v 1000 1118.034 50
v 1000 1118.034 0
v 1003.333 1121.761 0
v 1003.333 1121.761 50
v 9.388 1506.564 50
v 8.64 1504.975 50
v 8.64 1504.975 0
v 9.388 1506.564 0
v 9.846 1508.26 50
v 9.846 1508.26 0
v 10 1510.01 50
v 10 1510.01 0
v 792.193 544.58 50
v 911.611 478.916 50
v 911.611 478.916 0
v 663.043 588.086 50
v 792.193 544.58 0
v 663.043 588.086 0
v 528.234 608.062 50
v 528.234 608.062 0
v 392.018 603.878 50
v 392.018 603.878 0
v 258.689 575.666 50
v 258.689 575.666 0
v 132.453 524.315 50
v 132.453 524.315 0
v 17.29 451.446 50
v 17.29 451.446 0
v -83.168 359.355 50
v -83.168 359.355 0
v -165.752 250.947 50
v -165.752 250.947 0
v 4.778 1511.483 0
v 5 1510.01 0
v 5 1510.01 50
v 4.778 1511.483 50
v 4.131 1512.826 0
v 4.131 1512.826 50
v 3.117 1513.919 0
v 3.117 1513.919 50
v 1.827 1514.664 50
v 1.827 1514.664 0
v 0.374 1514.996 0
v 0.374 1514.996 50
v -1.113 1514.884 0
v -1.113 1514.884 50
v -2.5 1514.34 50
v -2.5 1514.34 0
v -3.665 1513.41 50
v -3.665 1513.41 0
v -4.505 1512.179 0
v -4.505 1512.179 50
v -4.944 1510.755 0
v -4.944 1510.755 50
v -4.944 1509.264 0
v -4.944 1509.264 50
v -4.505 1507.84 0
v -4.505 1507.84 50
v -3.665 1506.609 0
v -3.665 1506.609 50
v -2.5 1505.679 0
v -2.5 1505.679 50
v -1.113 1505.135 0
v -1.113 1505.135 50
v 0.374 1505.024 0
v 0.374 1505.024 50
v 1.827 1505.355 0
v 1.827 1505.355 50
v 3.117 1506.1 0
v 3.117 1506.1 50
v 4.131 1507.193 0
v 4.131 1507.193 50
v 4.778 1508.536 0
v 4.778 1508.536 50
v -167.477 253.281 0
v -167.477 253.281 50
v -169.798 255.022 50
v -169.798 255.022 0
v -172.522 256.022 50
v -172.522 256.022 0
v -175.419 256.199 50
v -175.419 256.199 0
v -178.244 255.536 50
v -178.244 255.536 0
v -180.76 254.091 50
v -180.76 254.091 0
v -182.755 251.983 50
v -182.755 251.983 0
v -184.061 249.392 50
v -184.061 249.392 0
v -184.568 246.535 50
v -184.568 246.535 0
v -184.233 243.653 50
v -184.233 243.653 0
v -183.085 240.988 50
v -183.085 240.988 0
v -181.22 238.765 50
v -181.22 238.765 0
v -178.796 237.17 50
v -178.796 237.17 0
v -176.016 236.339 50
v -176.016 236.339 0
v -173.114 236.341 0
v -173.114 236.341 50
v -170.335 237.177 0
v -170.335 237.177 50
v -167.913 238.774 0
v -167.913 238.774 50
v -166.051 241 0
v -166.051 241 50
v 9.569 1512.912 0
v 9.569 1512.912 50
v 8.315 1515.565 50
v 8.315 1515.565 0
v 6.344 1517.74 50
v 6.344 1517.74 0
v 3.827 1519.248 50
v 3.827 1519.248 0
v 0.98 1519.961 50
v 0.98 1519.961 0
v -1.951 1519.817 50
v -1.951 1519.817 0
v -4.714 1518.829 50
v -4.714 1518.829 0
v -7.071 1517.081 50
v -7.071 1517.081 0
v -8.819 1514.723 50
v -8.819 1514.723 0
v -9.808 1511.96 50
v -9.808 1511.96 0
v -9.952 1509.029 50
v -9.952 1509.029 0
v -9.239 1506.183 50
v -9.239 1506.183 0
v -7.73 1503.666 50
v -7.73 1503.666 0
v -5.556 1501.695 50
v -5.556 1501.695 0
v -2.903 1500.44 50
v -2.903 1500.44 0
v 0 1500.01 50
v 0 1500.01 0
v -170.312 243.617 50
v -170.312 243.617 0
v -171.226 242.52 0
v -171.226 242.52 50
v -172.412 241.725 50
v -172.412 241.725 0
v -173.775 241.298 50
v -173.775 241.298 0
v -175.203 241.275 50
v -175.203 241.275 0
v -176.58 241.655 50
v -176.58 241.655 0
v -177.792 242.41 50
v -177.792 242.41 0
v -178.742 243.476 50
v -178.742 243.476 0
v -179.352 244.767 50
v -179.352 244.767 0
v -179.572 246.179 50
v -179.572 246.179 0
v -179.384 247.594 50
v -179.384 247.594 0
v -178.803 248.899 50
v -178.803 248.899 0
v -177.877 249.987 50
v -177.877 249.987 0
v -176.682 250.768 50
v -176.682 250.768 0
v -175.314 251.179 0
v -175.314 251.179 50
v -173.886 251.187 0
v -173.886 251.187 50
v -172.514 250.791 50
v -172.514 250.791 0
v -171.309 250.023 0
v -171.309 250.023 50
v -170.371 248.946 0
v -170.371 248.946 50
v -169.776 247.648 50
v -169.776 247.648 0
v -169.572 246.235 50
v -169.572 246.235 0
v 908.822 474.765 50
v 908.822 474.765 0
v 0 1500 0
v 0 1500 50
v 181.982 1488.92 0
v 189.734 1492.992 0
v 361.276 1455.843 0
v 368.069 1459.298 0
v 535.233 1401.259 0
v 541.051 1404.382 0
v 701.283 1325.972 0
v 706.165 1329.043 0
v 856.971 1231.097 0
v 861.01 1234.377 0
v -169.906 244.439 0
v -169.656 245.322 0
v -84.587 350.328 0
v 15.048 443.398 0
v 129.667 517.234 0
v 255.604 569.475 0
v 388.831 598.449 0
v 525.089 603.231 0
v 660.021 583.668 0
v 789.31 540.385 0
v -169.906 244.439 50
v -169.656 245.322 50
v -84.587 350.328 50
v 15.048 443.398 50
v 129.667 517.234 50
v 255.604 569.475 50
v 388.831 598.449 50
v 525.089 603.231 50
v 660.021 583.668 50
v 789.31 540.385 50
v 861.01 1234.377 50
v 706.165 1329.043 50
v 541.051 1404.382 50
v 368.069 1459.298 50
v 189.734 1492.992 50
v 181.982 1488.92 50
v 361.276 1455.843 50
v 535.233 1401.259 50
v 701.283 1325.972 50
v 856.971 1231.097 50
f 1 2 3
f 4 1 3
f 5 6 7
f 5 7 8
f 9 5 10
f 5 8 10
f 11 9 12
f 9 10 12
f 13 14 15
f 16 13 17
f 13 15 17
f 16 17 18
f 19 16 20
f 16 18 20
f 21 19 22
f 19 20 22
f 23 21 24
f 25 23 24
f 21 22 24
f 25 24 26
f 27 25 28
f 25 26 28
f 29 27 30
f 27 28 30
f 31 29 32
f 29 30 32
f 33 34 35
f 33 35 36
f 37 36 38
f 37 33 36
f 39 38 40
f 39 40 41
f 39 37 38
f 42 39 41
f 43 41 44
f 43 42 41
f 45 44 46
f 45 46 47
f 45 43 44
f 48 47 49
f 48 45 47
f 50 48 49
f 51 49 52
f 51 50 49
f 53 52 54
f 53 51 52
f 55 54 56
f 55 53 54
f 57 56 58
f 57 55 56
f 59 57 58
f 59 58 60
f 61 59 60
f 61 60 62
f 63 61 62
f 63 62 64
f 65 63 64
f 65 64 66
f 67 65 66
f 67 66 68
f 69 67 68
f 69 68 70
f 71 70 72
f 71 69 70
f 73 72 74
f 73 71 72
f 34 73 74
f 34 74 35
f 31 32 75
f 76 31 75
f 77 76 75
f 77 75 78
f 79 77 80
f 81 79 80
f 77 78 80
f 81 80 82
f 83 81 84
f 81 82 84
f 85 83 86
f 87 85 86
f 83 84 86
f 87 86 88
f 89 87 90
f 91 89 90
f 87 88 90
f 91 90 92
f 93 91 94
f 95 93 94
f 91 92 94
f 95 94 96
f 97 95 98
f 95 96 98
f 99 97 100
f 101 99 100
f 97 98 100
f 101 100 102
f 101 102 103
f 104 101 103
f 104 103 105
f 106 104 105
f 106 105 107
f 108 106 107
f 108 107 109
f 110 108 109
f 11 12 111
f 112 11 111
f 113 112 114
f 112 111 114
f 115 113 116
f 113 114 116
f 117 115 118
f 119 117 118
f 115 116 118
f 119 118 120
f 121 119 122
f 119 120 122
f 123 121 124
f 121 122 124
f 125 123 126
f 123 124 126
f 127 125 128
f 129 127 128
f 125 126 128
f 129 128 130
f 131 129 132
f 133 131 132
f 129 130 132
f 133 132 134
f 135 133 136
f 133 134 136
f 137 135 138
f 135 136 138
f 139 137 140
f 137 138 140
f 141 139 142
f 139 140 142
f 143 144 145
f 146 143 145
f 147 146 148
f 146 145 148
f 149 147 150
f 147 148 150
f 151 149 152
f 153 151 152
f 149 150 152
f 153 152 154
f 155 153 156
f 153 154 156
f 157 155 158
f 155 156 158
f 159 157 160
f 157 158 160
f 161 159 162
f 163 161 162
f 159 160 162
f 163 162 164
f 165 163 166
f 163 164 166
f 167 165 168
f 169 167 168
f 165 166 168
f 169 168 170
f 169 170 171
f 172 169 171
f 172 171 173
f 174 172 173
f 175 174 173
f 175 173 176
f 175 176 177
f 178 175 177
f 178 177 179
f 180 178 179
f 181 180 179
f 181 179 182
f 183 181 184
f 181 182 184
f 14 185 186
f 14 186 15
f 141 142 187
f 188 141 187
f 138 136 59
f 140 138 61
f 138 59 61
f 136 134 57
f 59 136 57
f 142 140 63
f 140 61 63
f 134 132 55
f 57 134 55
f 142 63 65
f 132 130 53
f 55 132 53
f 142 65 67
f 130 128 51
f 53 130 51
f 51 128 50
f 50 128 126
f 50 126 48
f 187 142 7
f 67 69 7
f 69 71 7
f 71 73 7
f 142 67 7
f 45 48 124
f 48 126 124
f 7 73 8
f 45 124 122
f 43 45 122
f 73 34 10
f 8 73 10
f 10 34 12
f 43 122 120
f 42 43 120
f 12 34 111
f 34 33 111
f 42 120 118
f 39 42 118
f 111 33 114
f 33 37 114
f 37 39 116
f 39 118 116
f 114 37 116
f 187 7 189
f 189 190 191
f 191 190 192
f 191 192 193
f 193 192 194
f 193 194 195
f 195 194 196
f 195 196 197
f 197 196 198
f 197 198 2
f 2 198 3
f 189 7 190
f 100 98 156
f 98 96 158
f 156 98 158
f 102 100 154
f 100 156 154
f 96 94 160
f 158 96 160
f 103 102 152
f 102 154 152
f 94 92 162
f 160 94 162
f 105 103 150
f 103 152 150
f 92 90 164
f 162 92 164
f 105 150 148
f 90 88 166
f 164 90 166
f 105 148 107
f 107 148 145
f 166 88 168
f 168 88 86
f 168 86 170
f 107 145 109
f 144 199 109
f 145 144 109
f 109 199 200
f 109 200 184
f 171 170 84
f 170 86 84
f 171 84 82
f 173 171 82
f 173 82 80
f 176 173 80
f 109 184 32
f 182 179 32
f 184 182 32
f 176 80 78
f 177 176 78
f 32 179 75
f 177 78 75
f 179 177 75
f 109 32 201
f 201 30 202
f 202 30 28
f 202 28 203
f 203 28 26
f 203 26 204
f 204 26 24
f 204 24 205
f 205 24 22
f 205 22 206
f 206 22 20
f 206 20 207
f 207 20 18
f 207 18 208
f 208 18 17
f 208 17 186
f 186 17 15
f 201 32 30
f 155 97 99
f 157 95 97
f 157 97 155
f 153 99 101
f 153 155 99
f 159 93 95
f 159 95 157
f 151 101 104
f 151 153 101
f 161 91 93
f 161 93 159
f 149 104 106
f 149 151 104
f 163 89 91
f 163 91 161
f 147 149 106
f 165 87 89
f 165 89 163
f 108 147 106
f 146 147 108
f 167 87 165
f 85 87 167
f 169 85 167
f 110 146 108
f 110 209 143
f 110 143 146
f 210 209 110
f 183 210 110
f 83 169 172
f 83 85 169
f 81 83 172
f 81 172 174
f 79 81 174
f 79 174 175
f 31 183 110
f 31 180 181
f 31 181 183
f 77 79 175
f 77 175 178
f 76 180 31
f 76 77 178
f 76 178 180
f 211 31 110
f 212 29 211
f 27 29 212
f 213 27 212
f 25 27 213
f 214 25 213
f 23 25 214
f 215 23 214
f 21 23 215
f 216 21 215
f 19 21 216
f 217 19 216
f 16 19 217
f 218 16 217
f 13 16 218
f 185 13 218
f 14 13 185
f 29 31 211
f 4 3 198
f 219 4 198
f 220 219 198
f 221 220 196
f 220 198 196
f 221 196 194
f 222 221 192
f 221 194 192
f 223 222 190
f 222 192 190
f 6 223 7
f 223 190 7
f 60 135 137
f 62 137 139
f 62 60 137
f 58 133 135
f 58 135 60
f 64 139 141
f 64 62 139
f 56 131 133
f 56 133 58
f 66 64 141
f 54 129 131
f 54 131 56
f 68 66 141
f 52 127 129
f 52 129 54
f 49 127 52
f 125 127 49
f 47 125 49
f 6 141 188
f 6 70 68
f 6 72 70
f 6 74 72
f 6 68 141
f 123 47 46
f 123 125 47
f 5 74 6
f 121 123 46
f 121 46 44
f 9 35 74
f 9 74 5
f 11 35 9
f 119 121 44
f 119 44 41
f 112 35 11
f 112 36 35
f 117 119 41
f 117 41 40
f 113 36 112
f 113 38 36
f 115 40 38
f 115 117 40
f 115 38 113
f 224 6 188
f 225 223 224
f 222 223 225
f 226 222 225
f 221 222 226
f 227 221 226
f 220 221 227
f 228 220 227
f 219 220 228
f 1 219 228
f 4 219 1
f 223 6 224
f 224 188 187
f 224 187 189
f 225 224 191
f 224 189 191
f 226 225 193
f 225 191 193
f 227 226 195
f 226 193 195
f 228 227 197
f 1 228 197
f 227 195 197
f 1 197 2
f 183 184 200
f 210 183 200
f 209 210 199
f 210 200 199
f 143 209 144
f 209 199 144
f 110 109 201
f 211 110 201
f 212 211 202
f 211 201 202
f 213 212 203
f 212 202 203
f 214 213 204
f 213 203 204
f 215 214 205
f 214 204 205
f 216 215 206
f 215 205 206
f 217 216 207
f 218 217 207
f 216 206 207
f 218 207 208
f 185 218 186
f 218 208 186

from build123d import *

# Parameters (mm, degrees)
F0_R     = 5
F1_DEPTH = 50
F3_DEPTH = 50


# Not quite as in the source:
# - ends of sketch curves that miss each other by under 0.0002 mm in the source are joined


with BuildPart() as f1:
    # F0 (on Top) → F1 (new body)
    with BuildSketch(Plane.XY):
        with BuildLine():
            Line((0, 1505.0000020167), (0, 1500.0095272064))
            ThreePointArc((0, 1500.0095272064), (4.9828064884, 1501.3393692206), (8.6403438934, 1504.9751993065))
            ThreePointArc((8.6403438934, 1504.9751993065), (4.3201897461, 1504.9938013264), (0, 1505.0000020167))
        make_face()
        with BuildLine():
            ThreePointArc((10, 1510.0095272064), (-7.0710678119, 1517.0805950183), (0, 1500.0095272064))
            Line((0, 1500.0095272064), (0, 1505.0000020167))
            ThreePointArc((0, 1505.0000020167), (4.3201897461, 1504.9938013264), (8.6403438934, 1504.9751993065))
            ThreePointArc((8.6403438934, 1504.9751993065), (9.654103763, 1507.4021759579), (10, 1510.0095272064))
        make_face()
        with Locations((0, 1510.0095272064)):
            Circle(F0_R, mode=Mode.SUBTRACT)
        with BuildLine():
            ThreePointArc((0, 1500), (535.2331346596, 1401.2585384441), (1000, 1118.0339887499))
            Line((1000, 1118.0339887499), (1003.3333346778, 1121.7607702155))
            ThreePointArc((1003.3333346778, 1121.7607702155), (541.0508351311, 1404.3820704759), (8.6403438934, 1504.9751993065))
            ThreePointArc((8.6403438934, 1504.9751993065), (4.9828064884, 1501.3393692206), (0, 1500.0095272064))
            Line((0, 1500.0095272064), (0, 1500))
        make_face()
    extrude(amount=F1_DEPTH)


with BuildPart() as f3:
    # F2 (on Top) → F3 (new body)
    with BuildSketch(Plane.XY):
        with BuildLine():
            ThreePointArc((-165.7523488067, 250.9472365606), (-184.5677200008, 246.5350992369), (-166.051450216, 241.0003994084))
            Line((-166.051450216, 241.0003994084), (-170.3118440891, 243.6174672421))
            ThreePointArc((-170.3118440891, 243.6174672421), (-168.0424024134, 247.2887627444), (-165.7523488067, 250.9472365606))
        make_face()
        with BuildLine():
            ThreePointArc((-169.5722379622, 246.2345350757), (-169.7606909466, 244.8747500496), (-170.3118440891, 243.6174672421))
            ThreePointArc((-170.3118440891, 243.6174672421), (-179.3837849777, 247.5943201019), (-169.5722379622, 246.2345350757))
        make_face(mode=Mode.SUBTRACT)
        with BuildLine():
            Line((-170.3118440891, 243.6174672421), (-166.051454279, 241.0004019042))
            ThreePointArc((-166.051454279, 241.0004019042), (-164.9491439311, 243.5149650235), (-164.5722379622, 246.2345350757))
            ThreePointArc((-164.5722379622, 246.2345350757), (-164.8717510787, 248.6636407183), (-165.7523488067, 250.9472365606))
            ThreePointArc((-165.7523488067, 250.9472365606), (-168.0424024134, 247.2887627444), (-170.3118440891, 243.6174672421))
        make_face()
        with BuildLine():
            ThreePointArc((-166.051454279, 241.0004019042), (321.56850198, 586.9462325741), (908.8224537655, 474.7654159781))
            Line((908.8224537655, 474.7654159781), (911.6111110814, 478.9155175059))
            ThreePointArc((911.6111110814, 478.9155175059), (324.7260159117, 592.7373863711), (-165.7523488067, 250.9472365606))
            ThreePointArc((-165.7523488067, 250.9472365606), (-164.8717510787, 248.6636407183), (-164.5722379622, 246.2345350757))
            ThreePointArc((-164.5722379622, 246.2345350757), (-164.9491439311, 243.5149650235), (-166.051454279, 241.0004019042))
        make_face()
    extrude(amount=F3_DEPTH)


solid = Compound([f1.part, f3.part])
